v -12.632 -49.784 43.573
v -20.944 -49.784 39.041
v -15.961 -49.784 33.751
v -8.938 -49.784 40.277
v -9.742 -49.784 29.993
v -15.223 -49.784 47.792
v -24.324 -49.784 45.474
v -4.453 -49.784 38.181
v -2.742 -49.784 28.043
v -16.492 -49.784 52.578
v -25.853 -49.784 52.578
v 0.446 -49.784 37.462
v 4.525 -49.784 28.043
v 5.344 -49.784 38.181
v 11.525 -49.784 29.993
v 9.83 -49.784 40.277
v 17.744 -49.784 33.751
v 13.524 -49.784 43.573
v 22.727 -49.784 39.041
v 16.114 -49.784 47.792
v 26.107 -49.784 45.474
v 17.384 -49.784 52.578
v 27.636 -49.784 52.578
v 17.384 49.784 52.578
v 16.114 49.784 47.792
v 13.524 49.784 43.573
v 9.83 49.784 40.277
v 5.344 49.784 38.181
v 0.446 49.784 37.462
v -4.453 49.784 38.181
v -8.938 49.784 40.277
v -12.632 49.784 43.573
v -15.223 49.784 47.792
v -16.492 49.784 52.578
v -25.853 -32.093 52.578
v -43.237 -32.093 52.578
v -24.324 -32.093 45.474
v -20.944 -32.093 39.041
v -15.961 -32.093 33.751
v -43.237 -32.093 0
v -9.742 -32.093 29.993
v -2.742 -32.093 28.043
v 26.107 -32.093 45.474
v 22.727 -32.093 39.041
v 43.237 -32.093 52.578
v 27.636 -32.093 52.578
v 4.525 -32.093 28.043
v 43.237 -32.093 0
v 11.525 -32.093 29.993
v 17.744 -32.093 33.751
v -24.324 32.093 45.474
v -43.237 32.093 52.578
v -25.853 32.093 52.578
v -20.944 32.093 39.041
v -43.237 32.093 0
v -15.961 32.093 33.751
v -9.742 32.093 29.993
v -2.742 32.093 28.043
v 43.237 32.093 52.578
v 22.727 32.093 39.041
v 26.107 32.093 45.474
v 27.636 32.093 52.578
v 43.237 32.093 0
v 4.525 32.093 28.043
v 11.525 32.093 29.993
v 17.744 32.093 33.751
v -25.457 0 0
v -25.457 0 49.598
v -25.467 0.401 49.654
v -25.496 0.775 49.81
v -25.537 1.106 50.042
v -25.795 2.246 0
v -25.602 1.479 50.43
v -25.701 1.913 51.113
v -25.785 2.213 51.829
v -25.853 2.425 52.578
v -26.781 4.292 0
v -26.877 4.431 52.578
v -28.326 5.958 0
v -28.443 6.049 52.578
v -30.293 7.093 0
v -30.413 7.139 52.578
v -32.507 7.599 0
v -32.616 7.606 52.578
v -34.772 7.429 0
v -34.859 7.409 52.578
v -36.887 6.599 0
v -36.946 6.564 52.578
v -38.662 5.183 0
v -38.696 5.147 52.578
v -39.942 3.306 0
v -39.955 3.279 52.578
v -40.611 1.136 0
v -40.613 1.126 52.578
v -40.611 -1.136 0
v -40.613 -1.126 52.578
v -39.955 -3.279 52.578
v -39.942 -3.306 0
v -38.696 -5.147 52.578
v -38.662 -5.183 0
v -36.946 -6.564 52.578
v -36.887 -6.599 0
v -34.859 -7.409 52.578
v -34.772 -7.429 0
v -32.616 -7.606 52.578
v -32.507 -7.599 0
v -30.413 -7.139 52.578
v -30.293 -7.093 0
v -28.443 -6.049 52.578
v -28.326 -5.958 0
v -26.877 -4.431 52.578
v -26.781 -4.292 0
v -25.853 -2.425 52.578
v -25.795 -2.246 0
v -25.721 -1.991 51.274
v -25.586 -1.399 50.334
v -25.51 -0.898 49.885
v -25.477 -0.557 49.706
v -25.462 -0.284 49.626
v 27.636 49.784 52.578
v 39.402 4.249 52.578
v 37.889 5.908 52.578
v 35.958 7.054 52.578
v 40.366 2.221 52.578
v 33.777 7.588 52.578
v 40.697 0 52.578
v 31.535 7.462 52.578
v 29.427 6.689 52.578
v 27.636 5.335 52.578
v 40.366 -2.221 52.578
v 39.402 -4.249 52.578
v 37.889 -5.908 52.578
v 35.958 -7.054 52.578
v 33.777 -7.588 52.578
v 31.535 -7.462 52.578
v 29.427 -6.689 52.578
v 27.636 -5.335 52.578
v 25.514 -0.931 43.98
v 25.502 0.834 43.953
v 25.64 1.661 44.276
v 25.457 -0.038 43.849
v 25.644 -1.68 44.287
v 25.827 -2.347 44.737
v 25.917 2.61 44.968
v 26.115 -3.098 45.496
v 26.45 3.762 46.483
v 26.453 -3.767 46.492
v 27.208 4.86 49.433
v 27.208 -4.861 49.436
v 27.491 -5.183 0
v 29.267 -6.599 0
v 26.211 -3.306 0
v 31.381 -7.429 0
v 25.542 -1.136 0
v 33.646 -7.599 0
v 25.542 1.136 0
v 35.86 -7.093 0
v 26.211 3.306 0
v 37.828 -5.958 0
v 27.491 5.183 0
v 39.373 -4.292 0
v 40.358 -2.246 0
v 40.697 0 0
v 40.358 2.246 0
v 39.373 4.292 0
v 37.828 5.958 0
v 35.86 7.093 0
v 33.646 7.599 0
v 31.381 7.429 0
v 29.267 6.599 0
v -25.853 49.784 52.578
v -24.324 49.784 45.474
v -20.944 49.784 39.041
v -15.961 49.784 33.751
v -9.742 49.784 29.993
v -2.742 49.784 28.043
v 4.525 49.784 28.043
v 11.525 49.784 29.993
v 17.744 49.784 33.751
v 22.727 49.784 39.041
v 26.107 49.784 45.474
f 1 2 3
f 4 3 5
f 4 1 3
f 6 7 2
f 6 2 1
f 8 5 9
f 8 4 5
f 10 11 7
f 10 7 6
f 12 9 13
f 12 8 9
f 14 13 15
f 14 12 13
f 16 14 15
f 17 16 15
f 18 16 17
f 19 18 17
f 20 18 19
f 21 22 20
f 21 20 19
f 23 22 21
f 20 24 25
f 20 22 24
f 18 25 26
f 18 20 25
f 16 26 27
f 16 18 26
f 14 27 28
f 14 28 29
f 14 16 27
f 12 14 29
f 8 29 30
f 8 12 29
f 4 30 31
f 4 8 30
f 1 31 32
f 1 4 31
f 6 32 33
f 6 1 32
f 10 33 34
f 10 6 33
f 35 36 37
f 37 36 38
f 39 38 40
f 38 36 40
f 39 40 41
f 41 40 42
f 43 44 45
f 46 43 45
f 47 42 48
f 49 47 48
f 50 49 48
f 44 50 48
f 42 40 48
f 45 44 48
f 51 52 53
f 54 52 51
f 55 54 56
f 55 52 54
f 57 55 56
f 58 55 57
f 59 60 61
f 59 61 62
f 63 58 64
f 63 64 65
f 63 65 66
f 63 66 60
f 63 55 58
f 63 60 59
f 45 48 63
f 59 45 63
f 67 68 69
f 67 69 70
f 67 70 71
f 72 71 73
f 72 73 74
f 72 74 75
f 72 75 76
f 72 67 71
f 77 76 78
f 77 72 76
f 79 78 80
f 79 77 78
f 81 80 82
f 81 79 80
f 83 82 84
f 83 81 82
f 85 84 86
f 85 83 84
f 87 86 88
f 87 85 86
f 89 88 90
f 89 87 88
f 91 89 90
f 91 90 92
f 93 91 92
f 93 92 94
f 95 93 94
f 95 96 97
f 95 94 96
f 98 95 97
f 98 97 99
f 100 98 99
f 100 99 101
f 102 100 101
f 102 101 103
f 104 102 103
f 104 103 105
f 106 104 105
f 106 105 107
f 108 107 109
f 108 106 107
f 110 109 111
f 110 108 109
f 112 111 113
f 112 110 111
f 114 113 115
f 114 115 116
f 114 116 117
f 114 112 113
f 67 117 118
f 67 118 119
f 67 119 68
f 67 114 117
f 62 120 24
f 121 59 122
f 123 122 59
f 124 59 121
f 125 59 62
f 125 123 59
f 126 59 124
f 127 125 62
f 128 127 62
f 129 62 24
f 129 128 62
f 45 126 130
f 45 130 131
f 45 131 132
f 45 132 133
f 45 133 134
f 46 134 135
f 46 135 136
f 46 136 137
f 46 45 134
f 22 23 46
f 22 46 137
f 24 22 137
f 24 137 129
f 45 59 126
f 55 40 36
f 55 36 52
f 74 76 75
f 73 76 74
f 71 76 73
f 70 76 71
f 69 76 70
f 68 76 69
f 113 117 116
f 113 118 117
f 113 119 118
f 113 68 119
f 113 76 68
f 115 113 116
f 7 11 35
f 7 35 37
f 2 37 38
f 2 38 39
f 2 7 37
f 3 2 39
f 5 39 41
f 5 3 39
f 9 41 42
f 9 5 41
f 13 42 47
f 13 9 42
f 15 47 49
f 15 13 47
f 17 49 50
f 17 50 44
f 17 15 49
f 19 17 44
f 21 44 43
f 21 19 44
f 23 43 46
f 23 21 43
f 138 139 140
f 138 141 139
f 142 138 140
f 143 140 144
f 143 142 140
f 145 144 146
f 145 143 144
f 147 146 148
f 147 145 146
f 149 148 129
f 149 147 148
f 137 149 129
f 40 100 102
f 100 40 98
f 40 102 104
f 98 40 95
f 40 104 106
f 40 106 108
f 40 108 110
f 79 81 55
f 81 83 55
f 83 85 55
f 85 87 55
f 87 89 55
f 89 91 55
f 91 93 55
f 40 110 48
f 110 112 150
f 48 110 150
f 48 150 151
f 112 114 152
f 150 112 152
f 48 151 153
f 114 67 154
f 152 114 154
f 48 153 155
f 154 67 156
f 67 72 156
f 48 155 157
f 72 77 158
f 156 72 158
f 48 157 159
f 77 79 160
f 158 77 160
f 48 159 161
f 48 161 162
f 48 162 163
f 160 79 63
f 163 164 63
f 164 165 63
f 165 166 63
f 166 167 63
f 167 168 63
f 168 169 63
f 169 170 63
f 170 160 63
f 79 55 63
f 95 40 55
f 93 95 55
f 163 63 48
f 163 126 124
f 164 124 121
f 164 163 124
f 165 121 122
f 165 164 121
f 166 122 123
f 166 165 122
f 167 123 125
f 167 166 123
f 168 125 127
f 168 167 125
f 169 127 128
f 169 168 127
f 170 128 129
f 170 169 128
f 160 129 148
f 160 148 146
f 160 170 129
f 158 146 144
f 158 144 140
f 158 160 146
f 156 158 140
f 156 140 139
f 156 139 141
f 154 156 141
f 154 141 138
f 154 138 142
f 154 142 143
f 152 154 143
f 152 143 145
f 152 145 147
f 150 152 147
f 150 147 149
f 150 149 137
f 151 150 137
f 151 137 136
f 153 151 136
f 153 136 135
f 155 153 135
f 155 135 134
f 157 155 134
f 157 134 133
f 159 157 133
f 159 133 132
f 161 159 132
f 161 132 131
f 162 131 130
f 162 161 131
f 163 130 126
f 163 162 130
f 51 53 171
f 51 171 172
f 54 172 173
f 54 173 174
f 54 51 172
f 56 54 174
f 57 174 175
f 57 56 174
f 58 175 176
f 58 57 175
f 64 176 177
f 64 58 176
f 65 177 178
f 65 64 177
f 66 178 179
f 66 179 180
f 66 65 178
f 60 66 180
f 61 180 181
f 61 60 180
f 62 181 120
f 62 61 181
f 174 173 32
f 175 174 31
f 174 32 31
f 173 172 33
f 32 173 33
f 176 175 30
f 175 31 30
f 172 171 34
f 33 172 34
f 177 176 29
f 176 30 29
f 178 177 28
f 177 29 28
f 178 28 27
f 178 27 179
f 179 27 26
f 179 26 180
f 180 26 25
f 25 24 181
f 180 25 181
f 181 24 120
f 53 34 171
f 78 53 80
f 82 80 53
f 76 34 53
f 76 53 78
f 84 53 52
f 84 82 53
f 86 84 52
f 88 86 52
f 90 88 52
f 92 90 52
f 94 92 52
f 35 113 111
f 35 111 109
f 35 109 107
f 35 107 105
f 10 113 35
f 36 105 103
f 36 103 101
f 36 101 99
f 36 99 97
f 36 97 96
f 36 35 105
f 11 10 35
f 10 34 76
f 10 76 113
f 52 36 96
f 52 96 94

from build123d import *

# Parameters (mm, degrees)
F0_W     = 86.4731967449
F0_H     = 64.1862973571
F1_DEPTH = 52.578
F2_R     = 7.62
F3_DEPTH = 180.34
F5_DEPTH = 49.784
F7_DEPTH = 69.342


with BuildPart() as f1:
    # F0 (on Top) → F1 (new body)
    with BuildSketch(Plane.XY):
        Rectangle(F0_W, F0_H)
    extrude(amount=F1_DEPTH)

    # F2 (on Top) → F3 (cut)
    with BuildSketch(Plane.XY):
        with Locations((33.0765983725, 0)):
            Circle(F2_R)
        with Locations((-33.0765983725, 0)):
            Circle(F2_R)
    extrude(amount=F3_DEPTH, mode=Mode.SUBTRACT)

    # F4 (on Front) → F5 (join, symmetric)
    with BuildSketch(Plane.XZ):
        with BuildLine():
            ThreePointArc((17.383787781, 52.578), (0.4457375035, 37.4617067344), (-16.4923127741, 52.578))
            Line((-16.4923127741, 52.578), (-25.8528143167, 52.578))
            ThreePointArc((-25.8528143167, 52.578), (0.8914759383, 27.7956383617), (27.6357661933, 52.578))
            Line((27.6357661933, 52.578), (17.383787781, 52.578))
        make_face()
    extrude(amount=F5_DEPTH, both=True)

    # F7 (cut): a face of the model
    f7_faces = [f1.faces().sort_by_distance(p)[0] for p in [
        (0.4457375035, 32.0931486785, 46.2197735841),
    ]]
    extrude(f7_faces, amount=-F7_DEPTH, mode=Mode.SUBTRACT)


solid = f1.part
